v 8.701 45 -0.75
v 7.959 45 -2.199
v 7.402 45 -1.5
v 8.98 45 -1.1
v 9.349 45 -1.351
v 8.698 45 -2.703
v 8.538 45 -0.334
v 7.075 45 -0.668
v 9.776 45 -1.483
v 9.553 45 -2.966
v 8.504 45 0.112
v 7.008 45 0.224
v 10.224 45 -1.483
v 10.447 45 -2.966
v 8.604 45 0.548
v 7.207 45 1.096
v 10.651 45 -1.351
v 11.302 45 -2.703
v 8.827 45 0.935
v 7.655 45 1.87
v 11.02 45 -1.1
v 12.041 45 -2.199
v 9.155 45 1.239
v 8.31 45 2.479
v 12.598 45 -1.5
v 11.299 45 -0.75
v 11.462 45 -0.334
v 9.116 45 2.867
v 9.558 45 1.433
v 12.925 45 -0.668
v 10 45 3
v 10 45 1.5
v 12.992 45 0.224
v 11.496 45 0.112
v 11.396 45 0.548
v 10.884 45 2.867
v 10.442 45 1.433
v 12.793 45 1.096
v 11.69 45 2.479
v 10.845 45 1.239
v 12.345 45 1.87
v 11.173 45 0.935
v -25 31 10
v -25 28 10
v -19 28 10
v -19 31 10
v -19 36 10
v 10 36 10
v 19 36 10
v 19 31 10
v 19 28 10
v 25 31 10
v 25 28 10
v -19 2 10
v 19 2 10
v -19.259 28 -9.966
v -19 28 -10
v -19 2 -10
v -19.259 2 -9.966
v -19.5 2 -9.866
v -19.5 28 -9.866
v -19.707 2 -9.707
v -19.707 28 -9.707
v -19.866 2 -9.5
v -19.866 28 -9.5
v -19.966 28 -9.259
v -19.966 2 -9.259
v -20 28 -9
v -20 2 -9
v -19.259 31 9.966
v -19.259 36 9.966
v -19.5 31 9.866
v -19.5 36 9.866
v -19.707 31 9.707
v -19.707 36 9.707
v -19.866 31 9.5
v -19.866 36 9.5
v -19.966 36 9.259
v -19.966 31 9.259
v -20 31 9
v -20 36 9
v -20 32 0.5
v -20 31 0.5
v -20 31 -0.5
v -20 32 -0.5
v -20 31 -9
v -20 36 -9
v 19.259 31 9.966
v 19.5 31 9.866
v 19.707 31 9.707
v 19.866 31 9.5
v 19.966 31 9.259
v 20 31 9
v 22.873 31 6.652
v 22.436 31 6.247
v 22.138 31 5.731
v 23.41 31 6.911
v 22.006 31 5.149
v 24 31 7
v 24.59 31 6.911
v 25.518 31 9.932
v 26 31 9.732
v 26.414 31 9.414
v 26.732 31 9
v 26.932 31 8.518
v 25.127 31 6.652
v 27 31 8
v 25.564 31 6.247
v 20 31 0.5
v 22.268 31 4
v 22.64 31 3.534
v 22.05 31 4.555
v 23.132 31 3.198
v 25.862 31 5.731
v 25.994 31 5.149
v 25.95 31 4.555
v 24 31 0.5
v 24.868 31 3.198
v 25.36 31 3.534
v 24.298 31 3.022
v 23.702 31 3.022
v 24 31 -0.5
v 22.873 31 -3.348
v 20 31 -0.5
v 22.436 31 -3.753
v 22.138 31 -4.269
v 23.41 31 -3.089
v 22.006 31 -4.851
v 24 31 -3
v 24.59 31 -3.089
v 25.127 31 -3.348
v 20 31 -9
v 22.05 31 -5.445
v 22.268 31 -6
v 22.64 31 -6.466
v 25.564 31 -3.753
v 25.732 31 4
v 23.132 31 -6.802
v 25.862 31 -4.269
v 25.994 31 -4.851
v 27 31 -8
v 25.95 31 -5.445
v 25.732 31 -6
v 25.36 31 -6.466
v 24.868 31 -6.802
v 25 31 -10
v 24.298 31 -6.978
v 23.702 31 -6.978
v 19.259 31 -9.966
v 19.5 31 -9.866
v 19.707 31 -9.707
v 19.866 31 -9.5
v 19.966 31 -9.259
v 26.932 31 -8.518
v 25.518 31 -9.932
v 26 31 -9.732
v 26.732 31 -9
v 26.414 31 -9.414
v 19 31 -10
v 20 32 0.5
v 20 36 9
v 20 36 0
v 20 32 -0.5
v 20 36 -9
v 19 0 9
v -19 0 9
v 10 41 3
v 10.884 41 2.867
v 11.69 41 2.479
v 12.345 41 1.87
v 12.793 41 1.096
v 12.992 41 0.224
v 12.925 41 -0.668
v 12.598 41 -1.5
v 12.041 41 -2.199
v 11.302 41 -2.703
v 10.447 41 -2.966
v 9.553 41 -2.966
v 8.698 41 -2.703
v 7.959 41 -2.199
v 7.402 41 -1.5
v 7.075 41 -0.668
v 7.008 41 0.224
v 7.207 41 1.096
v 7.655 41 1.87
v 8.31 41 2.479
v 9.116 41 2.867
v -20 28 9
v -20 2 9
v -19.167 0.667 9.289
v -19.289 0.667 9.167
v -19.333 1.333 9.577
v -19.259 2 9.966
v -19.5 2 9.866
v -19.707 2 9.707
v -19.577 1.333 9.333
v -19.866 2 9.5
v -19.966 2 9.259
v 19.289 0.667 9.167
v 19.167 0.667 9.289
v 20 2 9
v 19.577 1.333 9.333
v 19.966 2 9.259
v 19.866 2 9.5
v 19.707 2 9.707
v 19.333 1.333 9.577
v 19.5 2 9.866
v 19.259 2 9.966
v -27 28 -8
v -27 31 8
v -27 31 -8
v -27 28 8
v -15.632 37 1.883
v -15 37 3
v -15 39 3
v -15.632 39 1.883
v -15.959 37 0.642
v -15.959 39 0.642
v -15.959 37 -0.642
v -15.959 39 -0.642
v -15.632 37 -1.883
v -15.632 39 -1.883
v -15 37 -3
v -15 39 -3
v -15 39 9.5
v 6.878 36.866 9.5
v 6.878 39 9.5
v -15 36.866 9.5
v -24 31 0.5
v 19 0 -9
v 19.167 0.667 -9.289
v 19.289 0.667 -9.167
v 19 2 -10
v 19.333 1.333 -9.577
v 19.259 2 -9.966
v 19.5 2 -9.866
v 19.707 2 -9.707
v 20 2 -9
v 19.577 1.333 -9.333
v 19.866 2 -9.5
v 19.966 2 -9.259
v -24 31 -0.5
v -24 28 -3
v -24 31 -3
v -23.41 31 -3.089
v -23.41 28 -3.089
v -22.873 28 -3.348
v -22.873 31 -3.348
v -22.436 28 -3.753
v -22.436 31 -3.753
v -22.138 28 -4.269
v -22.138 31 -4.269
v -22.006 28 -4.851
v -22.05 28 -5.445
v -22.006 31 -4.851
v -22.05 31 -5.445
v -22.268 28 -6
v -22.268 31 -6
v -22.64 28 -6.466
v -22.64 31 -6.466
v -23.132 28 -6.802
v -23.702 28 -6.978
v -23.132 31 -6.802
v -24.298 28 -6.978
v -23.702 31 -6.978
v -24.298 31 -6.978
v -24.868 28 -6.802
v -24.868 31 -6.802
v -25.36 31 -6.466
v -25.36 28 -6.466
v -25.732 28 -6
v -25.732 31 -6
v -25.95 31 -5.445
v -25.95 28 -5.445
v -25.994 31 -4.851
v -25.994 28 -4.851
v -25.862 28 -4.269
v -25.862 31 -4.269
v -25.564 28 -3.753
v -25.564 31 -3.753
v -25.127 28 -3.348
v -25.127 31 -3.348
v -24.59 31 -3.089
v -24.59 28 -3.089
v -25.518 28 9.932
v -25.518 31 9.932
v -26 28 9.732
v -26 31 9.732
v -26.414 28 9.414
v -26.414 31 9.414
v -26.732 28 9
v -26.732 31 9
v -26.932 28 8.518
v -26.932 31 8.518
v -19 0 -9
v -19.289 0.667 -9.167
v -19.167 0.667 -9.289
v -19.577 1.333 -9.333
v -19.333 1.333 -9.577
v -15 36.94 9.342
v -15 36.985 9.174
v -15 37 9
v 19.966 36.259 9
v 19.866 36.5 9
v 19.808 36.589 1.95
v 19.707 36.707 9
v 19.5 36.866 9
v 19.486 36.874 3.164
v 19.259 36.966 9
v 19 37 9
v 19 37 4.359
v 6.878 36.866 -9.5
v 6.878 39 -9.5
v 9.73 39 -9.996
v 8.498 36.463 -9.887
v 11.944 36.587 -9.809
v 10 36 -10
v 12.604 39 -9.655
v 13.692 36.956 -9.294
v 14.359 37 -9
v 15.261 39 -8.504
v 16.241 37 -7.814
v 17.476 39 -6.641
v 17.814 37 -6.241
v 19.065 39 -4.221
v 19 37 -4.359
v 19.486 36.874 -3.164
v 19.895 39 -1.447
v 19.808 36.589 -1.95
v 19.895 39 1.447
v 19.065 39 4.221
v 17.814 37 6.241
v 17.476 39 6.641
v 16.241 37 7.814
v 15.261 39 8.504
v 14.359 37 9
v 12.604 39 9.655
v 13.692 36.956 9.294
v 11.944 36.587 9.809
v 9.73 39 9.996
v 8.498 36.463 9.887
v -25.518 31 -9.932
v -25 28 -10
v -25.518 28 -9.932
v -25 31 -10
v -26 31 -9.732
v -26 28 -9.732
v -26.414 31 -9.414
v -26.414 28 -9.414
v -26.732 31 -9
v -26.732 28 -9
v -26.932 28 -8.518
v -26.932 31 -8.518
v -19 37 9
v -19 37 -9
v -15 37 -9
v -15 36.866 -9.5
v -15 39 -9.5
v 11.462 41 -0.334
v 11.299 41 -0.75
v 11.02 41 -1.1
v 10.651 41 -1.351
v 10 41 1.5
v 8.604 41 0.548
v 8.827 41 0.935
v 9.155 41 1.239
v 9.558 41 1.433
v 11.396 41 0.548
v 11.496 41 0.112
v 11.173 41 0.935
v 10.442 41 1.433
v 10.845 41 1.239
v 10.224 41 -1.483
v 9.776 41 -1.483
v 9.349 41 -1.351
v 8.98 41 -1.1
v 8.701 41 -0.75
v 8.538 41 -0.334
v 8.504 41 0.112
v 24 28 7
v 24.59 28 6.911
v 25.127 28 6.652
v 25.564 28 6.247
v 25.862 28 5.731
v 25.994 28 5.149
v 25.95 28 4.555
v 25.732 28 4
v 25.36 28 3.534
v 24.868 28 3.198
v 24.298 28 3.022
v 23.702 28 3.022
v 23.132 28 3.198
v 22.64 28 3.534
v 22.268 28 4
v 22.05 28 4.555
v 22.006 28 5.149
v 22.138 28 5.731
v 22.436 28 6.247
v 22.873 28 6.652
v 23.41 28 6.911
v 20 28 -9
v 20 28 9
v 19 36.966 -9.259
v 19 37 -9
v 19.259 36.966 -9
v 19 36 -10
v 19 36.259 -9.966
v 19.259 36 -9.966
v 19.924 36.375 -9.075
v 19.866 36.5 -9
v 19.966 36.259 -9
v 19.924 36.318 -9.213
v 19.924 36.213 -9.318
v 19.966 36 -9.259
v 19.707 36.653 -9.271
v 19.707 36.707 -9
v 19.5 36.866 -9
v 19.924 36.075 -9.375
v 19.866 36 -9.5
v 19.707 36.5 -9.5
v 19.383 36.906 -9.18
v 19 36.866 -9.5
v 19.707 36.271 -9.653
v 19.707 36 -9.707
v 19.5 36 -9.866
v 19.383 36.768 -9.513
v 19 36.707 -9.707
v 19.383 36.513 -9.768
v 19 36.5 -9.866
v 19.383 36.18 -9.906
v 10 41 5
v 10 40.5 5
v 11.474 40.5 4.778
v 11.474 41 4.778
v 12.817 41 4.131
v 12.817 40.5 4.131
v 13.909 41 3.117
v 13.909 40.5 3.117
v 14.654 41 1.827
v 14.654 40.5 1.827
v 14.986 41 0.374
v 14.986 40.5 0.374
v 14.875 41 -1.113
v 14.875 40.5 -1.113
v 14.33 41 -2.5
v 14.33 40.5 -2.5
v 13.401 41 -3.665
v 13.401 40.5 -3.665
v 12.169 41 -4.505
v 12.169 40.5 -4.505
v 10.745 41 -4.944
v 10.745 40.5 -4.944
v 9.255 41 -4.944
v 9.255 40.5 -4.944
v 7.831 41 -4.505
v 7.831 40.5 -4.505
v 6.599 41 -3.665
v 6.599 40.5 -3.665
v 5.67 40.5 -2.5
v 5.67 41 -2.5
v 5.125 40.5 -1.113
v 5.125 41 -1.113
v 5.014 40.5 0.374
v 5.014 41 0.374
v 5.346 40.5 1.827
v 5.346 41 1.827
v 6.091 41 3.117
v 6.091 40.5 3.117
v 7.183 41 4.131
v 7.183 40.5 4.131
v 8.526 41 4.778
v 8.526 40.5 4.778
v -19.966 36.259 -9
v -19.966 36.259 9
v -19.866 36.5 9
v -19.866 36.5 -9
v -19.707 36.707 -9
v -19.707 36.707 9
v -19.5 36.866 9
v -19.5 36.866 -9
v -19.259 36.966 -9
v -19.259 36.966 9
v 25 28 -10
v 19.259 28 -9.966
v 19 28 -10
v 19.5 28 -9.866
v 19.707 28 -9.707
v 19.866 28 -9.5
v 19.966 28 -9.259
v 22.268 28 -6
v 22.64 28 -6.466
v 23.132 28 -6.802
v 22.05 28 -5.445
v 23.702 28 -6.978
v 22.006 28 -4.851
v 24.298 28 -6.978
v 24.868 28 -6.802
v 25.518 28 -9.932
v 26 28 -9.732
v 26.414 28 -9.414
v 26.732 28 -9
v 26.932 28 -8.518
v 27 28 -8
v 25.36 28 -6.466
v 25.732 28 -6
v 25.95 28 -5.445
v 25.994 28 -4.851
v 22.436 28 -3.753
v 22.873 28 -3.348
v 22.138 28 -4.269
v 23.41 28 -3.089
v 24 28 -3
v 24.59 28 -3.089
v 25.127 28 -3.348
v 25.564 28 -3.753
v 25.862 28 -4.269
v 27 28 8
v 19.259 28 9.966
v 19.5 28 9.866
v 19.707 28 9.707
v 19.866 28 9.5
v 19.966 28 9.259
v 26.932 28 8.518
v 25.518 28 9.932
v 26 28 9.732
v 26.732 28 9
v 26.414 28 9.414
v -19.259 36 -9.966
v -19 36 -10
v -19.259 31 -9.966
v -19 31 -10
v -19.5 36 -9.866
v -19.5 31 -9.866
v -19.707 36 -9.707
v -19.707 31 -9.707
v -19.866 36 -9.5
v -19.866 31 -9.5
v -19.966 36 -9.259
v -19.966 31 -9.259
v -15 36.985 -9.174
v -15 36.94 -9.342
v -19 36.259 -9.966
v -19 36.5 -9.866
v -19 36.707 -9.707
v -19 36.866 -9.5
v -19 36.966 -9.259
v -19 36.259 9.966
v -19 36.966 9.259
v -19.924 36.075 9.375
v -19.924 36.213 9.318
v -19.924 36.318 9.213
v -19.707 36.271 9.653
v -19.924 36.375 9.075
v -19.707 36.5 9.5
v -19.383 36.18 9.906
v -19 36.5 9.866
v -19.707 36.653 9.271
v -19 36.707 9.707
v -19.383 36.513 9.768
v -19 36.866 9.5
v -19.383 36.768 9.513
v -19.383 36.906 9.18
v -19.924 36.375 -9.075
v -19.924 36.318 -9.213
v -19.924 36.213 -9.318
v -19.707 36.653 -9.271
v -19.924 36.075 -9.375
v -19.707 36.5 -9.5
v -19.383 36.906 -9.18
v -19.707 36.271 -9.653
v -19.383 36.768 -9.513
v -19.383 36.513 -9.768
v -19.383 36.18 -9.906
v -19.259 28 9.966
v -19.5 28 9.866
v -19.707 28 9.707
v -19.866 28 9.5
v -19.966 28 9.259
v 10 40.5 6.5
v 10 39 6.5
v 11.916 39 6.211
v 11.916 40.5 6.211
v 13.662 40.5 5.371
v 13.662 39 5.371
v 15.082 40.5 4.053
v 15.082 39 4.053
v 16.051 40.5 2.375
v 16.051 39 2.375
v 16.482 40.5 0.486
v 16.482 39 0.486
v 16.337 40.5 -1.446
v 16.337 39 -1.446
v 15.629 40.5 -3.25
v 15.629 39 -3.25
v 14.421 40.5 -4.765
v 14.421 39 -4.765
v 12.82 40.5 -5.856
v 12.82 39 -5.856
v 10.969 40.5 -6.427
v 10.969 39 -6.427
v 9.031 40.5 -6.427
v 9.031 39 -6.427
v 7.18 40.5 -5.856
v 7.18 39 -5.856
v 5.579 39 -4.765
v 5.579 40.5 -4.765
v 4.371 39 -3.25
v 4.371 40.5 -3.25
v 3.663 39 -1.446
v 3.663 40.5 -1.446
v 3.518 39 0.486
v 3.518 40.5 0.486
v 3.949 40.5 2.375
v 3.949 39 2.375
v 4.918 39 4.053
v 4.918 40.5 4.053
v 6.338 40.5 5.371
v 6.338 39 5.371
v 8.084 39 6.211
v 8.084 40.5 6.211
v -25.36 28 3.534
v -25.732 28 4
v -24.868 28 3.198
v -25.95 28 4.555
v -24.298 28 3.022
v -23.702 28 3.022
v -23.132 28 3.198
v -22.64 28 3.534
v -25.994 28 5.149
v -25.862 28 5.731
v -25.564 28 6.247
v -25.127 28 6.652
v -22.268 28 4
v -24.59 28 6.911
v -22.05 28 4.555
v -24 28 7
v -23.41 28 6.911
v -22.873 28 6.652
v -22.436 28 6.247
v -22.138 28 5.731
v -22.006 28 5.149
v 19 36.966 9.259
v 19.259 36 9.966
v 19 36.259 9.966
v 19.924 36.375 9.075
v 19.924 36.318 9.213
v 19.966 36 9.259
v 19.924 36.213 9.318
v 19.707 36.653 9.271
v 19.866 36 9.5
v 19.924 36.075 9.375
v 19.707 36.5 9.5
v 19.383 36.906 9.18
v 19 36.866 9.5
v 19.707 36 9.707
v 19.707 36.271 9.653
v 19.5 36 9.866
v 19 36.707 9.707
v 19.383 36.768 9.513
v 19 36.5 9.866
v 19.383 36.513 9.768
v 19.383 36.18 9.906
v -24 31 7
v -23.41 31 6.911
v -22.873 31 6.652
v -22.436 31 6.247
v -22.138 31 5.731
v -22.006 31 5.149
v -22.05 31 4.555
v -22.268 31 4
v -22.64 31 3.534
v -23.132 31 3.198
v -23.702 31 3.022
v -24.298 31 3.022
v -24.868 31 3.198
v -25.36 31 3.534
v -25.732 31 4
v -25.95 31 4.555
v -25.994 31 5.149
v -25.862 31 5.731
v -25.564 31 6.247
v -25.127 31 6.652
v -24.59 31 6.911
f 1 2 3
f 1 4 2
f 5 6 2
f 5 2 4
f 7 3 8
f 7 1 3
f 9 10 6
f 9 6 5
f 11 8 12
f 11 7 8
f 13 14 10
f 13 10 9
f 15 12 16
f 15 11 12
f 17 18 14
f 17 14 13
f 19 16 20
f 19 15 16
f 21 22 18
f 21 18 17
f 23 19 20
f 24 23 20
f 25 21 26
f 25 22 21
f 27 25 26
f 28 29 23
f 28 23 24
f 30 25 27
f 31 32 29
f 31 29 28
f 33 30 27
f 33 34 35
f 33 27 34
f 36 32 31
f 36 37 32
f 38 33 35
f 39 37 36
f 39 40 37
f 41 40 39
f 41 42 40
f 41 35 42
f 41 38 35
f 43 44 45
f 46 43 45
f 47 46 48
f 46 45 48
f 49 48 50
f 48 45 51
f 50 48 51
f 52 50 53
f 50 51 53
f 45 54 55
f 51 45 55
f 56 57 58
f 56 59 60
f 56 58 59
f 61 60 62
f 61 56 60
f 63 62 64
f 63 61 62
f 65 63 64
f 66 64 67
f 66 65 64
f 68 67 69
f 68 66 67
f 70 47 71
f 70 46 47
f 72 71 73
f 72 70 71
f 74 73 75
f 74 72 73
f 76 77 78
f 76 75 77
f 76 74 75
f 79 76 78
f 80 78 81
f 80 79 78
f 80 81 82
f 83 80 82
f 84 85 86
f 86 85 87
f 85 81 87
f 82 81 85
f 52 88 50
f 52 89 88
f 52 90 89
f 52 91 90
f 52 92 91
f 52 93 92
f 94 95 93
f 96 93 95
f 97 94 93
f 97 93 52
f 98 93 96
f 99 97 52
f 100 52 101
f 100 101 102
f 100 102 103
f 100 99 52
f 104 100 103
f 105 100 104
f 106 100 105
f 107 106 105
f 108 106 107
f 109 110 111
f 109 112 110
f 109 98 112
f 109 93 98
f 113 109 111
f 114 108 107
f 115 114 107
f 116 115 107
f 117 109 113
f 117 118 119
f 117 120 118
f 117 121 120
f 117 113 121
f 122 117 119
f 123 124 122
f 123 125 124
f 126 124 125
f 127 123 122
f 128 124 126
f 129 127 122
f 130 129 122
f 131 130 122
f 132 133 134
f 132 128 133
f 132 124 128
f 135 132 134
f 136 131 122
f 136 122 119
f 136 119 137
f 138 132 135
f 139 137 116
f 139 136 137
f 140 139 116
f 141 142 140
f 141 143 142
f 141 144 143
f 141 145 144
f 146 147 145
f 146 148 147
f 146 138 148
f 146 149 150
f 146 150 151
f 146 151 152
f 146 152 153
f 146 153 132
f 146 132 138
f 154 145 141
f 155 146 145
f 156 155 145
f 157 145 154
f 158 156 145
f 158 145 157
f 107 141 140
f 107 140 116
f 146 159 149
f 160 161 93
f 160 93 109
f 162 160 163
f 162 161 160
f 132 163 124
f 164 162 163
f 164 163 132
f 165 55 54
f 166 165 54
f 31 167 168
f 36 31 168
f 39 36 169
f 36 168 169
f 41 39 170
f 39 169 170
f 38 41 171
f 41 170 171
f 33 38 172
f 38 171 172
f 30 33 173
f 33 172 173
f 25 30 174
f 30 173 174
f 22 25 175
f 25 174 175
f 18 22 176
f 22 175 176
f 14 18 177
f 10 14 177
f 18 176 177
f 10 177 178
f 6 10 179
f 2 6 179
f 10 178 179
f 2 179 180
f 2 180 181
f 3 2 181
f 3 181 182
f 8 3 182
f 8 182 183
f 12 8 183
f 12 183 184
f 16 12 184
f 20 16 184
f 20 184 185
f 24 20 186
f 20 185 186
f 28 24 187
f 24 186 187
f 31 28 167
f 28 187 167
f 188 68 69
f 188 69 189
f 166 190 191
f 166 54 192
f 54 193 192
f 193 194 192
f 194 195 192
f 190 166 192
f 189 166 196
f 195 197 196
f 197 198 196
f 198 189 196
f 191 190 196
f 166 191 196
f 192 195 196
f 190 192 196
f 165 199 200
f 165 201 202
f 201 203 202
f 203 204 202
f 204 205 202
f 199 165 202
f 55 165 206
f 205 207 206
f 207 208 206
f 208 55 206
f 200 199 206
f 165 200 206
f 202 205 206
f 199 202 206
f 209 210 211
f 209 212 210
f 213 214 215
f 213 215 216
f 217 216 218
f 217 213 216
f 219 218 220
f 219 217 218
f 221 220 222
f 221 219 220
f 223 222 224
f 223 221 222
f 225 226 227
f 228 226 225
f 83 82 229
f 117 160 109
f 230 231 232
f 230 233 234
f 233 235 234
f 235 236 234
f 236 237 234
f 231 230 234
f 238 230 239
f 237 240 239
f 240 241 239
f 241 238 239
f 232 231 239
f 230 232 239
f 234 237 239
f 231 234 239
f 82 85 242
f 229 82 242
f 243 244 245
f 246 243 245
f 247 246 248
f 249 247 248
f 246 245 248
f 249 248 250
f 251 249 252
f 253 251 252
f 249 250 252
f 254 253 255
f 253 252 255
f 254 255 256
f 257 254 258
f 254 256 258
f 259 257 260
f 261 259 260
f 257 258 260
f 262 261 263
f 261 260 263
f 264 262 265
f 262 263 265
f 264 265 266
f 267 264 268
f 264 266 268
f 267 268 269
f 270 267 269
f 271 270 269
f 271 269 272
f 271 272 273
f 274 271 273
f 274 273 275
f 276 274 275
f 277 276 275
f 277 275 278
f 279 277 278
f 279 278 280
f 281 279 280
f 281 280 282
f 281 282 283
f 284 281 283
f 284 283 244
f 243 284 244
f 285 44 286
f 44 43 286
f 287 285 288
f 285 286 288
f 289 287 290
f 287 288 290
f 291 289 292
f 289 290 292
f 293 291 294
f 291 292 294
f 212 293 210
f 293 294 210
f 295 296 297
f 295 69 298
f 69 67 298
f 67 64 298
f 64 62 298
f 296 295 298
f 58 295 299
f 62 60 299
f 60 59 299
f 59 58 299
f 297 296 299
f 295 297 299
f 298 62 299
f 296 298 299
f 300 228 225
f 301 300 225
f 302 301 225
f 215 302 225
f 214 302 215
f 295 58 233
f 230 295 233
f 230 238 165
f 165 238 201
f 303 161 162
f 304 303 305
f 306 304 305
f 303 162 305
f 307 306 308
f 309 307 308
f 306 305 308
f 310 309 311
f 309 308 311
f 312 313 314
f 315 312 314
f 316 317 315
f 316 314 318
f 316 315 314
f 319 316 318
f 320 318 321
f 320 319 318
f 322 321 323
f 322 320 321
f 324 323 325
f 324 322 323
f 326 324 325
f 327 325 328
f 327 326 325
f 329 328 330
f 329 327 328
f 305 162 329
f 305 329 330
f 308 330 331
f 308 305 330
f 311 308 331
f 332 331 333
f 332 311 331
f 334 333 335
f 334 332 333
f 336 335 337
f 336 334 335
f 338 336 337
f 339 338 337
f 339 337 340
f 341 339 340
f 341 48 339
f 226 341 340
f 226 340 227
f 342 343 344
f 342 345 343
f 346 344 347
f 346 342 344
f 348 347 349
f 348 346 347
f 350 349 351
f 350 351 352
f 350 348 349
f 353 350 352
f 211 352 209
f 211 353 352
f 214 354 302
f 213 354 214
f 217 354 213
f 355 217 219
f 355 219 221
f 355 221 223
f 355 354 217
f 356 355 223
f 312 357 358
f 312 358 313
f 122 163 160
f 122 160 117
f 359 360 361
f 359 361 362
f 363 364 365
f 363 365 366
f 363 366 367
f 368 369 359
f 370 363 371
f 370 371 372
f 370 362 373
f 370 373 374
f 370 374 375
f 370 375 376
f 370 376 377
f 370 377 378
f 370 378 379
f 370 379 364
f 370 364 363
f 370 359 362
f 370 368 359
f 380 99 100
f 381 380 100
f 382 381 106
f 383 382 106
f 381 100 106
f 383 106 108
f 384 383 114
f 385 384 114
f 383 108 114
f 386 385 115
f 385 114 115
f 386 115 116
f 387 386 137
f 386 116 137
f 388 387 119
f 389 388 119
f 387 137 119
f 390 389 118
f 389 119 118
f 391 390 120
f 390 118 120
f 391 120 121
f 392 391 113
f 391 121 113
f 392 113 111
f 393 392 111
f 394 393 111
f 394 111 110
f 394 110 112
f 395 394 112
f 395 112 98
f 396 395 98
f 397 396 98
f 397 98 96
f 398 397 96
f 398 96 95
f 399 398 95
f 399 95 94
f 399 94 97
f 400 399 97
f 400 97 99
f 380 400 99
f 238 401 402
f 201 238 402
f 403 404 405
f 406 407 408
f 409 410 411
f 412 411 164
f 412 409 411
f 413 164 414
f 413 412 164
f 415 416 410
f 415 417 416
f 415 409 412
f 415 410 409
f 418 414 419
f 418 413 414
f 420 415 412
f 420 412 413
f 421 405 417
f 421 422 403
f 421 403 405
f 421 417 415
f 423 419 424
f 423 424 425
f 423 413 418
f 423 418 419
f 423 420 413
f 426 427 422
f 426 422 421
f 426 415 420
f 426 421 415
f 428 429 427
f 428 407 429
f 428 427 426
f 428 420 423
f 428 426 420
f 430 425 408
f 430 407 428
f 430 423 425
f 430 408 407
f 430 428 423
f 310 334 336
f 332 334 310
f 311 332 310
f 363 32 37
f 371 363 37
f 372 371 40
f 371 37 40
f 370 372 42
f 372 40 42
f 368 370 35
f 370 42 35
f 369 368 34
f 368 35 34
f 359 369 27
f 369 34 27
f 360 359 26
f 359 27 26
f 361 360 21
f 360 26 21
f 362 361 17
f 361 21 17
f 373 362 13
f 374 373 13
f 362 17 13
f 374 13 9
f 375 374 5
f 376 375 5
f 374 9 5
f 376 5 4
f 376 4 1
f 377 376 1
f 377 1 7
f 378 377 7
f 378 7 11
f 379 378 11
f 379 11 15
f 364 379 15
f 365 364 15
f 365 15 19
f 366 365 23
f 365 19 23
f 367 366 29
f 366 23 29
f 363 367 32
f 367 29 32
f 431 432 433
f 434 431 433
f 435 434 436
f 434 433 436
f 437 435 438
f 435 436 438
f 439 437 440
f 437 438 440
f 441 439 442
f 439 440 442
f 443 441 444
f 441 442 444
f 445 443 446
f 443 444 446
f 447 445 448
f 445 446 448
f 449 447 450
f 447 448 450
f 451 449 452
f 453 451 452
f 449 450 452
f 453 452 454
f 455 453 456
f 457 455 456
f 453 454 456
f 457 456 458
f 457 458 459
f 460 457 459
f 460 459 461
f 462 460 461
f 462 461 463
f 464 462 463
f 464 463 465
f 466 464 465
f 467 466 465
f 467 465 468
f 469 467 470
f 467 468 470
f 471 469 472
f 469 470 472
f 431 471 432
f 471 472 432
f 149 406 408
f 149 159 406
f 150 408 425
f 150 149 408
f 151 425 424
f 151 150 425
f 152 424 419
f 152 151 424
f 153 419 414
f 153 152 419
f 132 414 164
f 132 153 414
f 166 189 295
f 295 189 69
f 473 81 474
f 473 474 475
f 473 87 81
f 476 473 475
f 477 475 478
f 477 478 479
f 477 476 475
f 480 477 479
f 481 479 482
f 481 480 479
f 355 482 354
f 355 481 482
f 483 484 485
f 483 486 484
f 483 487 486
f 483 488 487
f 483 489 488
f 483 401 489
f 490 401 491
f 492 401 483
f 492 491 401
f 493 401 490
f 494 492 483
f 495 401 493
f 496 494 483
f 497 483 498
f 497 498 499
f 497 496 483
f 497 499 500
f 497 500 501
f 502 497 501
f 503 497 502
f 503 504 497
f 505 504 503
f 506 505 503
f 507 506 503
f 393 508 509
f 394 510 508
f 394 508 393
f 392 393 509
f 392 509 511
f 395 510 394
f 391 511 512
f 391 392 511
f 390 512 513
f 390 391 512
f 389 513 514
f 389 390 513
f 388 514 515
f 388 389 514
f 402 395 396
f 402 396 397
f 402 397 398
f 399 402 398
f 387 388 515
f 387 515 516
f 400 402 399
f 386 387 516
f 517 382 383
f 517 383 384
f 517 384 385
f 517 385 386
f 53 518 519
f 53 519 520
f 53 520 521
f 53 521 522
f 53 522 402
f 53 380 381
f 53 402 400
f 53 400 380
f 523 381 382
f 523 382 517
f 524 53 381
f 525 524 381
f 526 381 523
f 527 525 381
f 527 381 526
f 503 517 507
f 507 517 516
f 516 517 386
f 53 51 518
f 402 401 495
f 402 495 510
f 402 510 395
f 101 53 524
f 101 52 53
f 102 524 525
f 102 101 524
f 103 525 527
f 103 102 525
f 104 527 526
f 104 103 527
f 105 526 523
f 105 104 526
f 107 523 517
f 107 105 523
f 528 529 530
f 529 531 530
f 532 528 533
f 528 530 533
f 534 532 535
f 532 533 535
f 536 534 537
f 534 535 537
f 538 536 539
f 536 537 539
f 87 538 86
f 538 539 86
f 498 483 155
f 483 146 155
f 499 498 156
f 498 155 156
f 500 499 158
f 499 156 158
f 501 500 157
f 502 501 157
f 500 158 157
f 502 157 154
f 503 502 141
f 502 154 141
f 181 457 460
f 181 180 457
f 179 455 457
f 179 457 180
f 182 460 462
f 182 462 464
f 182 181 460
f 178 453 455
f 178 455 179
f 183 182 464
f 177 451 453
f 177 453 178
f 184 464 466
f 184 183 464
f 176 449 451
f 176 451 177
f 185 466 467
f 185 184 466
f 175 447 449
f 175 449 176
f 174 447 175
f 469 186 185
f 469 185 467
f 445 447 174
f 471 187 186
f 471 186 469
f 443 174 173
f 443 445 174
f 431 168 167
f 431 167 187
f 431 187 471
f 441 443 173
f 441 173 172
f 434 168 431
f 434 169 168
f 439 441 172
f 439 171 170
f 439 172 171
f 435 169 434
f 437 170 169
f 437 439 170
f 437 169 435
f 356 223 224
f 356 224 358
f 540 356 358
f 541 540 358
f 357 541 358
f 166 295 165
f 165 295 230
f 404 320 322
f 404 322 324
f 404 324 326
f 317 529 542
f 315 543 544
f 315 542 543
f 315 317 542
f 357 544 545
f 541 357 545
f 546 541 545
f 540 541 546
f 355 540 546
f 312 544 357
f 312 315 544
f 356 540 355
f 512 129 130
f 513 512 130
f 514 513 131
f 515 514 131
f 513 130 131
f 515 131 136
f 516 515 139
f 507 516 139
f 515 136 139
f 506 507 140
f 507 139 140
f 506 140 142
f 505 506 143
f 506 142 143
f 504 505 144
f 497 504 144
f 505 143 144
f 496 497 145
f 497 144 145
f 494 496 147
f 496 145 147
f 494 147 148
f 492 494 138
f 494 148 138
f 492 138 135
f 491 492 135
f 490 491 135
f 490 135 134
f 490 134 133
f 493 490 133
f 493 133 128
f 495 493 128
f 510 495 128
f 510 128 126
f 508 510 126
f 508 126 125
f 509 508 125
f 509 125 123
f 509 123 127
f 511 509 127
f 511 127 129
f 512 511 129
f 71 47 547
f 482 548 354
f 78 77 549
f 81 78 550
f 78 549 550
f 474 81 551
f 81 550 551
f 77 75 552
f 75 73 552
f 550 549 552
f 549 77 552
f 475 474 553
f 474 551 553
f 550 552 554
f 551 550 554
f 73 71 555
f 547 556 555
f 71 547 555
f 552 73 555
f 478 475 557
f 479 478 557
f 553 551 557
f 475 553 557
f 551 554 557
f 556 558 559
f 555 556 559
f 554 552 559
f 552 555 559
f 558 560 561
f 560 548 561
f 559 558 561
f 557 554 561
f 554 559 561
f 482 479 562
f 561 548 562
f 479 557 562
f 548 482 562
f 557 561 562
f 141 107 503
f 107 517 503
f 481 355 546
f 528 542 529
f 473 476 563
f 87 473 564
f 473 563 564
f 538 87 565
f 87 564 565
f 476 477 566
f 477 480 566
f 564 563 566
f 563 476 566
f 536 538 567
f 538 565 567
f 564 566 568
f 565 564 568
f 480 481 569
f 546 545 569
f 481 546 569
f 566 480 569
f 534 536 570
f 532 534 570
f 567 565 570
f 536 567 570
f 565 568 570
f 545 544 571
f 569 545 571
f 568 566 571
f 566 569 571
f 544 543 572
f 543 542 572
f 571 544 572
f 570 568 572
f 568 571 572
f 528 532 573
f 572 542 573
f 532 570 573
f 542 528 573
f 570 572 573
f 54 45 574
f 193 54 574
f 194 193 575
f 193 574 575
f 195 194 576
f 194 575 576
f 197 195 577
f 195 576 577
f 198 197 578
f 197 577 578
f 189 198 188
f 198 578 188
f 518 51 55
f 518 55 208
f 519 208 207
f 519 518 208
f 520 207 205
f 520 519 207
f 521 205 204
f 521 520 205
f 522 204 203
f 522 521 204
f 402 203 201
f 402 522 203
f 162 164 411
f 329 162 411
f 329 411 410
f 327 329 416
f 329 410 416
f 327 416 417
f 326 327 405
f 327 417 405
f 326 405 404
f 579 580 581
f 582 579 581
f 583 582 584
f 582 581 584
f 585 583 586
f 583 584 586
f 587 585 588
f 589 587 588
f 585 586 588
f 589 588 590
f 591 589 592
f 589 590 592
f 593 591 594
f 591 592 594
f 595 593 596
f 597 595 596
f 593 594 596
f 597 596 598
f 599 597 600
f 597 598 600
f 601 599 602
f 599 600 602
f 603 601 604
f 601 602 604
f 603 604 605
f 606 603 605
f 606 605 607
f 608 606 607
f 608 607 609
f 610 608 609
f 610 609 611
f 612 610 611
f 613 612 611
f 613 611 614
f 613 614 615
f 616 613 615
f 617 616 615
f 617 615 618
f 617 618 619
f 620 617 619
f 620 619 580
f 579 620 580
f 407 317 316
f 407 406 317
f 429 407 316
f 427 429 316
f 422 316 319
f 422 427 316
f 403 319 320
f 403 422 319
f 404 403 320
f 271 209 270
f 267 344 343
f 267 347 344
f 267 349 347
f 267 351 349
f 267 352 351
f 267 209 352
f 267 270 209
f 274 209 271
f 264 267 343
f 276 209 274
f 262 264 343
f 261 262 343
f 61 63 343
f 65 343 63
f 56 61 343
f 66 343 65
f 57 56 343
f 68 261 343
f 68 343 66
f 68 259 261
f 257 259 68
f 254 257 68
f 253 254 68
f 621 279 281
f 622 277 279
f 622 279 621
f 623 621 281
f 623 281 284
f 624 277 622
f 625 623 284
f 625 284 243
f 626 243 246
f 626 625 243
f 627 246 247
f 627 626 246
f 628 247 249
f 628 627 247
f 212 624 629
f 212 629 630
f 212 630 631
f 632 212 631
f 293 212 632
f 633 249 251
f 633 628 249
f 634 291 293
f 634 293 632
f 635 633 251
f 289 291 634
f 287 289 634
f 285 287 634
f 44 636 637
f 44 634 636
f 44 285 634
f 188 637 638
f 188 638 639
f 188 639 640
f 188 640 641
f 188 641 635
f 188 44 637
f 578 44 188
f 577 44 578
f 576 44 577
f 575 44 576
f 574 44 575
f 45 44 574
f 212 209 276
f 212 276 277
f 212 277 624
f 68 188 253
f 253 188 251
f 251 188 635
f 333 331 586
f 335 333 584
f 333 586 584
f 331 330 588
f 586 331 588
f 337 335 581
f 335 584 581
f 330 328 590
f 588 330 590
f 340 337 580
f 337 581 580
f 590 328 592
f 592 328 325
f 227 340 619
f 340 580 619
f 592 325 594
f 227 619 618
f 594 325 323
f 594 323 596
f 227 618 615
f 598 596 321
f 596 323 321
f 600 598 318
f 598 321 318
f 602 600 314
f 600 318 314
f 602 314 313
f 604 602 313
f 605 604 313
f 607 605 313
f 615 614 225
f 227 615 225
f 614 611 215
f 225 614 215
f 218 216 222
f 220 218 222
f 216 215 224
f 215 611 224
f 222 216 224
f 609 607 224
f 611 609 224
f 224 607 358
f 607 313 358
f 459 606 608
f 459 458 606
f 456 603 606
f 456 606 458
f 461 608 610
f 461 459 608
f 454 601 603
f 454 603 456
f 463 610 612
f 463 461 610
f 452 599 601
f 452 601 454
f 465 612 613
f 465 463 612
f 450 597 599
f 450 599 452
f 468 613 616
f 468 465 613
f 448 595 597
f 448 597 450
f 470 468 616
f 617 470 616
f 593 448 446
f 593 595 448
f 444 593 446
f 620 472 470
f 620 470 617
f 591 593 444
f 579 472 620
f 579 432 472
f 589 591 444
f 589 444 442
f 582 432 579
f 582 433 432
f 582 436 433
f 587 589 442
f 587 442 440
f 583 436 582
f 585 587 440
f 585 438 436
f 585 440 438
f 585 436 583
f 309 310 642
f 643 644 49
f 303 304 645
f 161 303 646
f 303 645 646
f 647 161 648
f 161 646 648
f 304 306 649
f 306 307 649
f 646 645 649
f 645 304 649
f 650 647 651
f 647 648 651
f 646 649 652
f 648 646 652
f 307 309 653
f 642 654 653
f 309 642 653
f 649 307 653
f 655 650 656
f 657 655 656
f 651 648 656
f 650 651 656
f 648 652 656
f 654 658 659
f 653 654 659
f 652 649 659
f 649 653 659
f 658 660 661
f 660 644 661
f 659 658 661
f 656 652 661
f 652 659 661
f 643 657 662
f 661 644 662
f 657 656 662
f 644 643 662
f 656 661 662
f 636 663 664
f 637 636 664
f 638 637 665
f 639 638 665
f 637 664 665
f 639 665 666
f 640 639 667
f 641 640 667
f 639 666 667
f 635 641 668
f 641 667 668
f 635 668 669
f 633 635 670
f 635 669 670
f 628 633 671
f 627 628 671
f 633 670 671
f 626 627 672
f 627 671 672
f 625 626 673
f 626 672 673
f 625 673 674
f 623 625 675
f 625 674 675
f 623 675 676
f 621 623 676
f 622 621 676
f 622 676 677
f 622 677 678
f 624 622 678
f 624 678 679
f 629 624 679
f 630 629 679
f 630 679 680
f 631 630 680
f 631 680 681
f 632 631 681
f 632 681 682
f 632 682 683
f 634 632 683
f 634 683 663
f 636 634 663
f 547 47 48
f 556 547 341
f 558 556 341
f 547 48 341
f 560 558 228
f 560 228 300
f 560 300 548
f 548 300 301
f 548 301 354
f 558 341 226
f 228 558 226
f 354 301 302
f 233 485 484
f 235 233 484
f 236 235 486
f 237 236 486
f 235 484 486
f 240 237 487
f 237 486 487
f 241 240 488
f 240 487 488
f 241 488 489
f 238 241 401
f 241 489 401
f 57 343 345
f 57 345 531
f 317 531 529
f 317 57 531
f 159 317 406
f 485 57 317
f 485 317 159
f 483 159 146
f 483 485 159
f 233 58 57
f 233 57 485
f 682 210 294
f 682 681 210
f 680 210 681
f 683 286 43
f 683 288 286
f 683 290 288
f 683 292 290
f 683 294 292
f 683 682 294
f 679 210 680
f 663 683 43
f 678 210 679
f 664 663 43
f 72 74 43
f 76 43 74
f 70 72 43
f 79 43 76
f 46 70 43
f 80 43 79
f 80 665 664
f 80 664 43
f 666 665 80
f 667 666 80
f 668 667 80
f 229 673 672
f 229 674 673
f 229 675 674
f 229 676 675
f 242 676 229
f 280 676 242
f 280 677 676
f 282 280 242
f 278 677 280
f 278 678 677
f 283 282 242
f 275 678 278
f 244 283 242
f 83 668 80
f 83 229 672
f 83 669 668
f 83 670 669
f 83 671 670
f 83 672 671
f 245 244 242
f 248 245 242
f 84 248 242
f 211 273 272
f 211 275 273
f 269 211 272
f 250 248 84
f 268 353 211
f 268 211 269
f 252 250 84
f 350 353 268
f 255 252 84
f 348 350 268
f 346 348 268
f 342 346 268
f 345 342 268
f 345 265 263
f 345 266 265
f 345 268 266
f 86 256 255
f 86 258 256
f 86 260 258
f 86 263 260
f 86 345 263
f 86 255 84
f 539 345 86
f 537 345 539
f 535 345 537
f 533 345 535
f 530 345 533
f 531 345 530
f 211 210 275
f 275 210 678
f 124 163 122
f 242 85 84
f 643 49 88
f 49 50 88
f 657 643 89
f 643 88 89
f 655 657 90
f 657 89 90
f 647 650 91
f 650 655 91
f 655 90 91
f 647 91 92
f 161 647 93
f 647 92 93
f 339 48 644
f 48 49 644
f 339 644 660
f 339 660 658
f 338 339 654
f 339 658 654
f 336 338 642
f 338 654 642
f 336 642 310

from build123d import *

# Parameters (mm, degrees)
SKETCH_1_W          = 54
SKETCH_1_H          = 20
EXTRUDE_1_DEPTH     = 37
SKETCH_2_W          = 67.922695334
SKETCH_2_H          = 39.407561178
SKETCH_2_W_2        = 40
SKETCH_2_H_2        = 20
CUT_EXTRUDE_1_DEPTH = 28
SKETCH_3_W          = 67.922695334
SKETCH_3_H          = 33.385731604
SKETCH_3_W_2        = 40
SKETCH_3_H_2        = 20
CUT_EXTRUDE_2_DEPTH = 6
FILLET_1_R          = 1
FILLET_2_R          = 2
CHAMFER_1_SIZE      = 1
CHAMFER_1_SIZE2     = 2
SKETCH_4_R          = 2
CUT_EXTRUDE_3_DEPTH = 30
RIB_1_REACH         = 48.883
SKETCH_5_WALL_W     = 99.888770984
SKETCH_5_WALL_H     = 1
EXTRUDE_START       = -1
EXTRUDE_4_DEPTH     = 3
SKETCH_9_R          = 6.5
EXTRUDE_5_DEPTH     = 2
CUT_EXTRUDE_START   = -0.5
SKETCH_10_R         = 6.5
SKETCH_10_R_2       = 5
CUT_EXTRUDE_4_DEPTH = 0.5
SKETCH_11_R         = 3
EXTRUDE_6_DEPTH     = 4
SKETCH_14_R         = 1.5
CUT_EXTRUDE_5_DEPTH = 4


with BuildPart() as part:
    # 草图1 → 凸台-拉伸1 (new body)
    with BuildSketch(Plane(origin=(0, 0, 0), x_dir=(1, 0, 0), z_dir=(0, 1, 0))):
        Rectangle(SKETCH_1_W, SKETCH_1_H)
    extrude(amount=EXTRUDE_1_DEPTH)

    # 草图2 → 切除-拉伸1 (cut)
    with BuildSketch(Plane.XZ):
        Rectangle(SKETCH_2_W, SKETCH_2_H)
        Rectangle(SKETCH_2_W_2, SKETCH_2_H_2, mode=Mode.SUBTRACT)
    extrude(amount=-CUT_EXTRUDE_1_DEPTH, mode=Mode.SUBTRACT)

    # 草图3 → 切除-拉伸2 (cut)
    with BuildSketch(Plane(origin=(0, 37, 0), x_dir=(1, 0, 0), z_dir=(0, 1, 0))):
        Rectangle(SKETCH_3_W, SKETCH_3_H)
        Rectangle(SKETCH_3_W_2, SKETCH_3_H_2, mode=Mode.SUBTRACT)
    extrude(amount=-CUT_EXTRUDE_2_DEPTH, mode=Mode.SUBTRACT)

    # 圆角1
    fillet_1_edges = [part.edges().sort_by_distance(p)[0] for p in [
        (20, 14, -10),
        (-20, 14, -10),
        (-20, 14, 10),
        (20, 14, 10),
        (0, 37, -10),
        (0, 37, 10),
        (20, 37, 0),
        (20, 34, 10),
        (-20, 34, 10),
        (-20, 37, 0),
        (-20, 34, -10),
        (20, 34, -10),
    ]]
    fillet(fillet_1_edges, radius=FILLET_1_R)

    # 圆角2
    fillet_2_edges = [part.edges().sort_by_distance(p)[0] for p in [
        (27, 29.5, 10),
        (-27, 29.5, 10),
        (-27, 29.5, -10),
        (27, 29.5, -10),
    ]]
    fillet(fillet_2_edges, radius=FILLET_2_R)

    # 倒角1
    chamfer_1_edges = [part.edges().sort_by_distance(p)[0] for p in [
        (0, 0, -10),
        (0, 0, 10),
        (-20, 0, 0),
        (20, 0, 0),
        (-19.707106781, 0, 9.707106781),
        (19.707106781, 0, 9.707106781),
        (19.707106781, 0, -9.707106781),
        (-19.707106781, 0, -9.707106781),
    ]]
    chamfer_1_side = [part.faces().sort_by_distance(p)[0] for p in [
        (0, 0, 0),
    ]]
    chamfer(chamfer_1_edges, length=CHAMFER_1_SIZE, length2=CHAMFER_1_SIZE2, reference=chamfer_1_side[0])

    # 草图4 → 切除-拉伸3 (cut)
    with BuildSketch(Plane(origin=(0, 37, 0), x_dir=(1, 0, 0), z_dir=(0, 1, 0))):
        with Locations(Location((-24, 5, 0), (0, 0, 270))):
            Circle(SKETCH_4_R)
        with Locations(Location((-24, -5, 0), (0, 0, 270))):
            Circle(SKETCH_4_R)
        with Locations(Location((24, -5, 0), (0, 0, 270))):
            Circle(SKETCH_4_R)
        with Locations(Location((24, 5, 0), (0, 0, 270))):
            Circle(SKETCH_4_R)
    extrude(amount=-CUT_EXTRUDE_3_DEPTH, mode=Mode.SUBTRACT)

    # 草图5 wall → 筋1 (add, up to next)
    with BuildSketch(Plane(origin=(-22, 31.5, 0), x_dir=(-0.970142500145, -0.242535625036, 0), z_dir=(0.242535625036, -0.970142500145, 0)), mode=Mode.PRIVATE) as rib_1_sk1:
        Rectangle(SKETCH_5_WALL_W, SKETCH_5_WALL_H)
    rib_1_tool1 = extrude(rib_1_sk1.sketch, amount=RIB_1_REACH, mode=Mode.PRIVATE) - part.part
    rib_1 = rib_1_tool1.solids().sort_by_distance((-22, 31.5, 0))[0]
    add(rib_1)

    # 镜向1: 筋1 across plane
    add(rib_1.mirror(Plane(origin=(0, 0, 0), x_dir=(0, 0, 1), z_dir=(1, 0, 0))))

    # 草图8 → 凸台-拉伸4 (add)
    with BuildSketch(Plane(origin=(0, 37, 0), x_dir=(1, 0, 0), z_dir=(0, 1, 0)).offset(EXTRUDE_START)):
        with BuildLine():
            Line((-15, 9.5), (6.877501001, 9.5))
            ThreePointArc((6.877501001, 9.5), (20, 0), (6.877501001, -9.5))
            Line((6.877501001, -9.5), (-15, -9.5))
            Line((-15, -9.5), (-15, -3))
            ThreePointArc((-15, -3), (-16, 0), (-15, 3))
            Line((-15, 3), (-15, 9.5))
        make_face()
    extrude(amount=EXTRUDE_4_DEPTH)

    # 草图9 → 凸台-拉伸5 (add)
    with BuildSketch(Plane(origin=(0, 39, 0), x_dir=(1, 0, 0), z_dir=(0, 1, 0))):
        with Locations(Location((10, 0, 0), (0, 0, 270))):
            Circle(SKETCH_9_R)
    extrude(amount=EXTRUDE_5_DEPTH)

    # 草图10 → 切除-拉伸4 (cut)
    with BuildSketch(Plane(origin=(0, 41, 0), x_dir=(1, 0, 0), z_dir=(0, 1, 0)).offset(CUT_EXTRUDE_START)):
        with Locations(Location((10, 0, 0), (0, 0, 270))):
            Circle(SKETCH_10_R)
        with Locations(Location((10, 0, 0), (0, 0, 270))):
            Circle(SKETCH_10_R_2, mode=Mode.SUBTRACT)
    extrude(amount=CUT_EXTRUDE_4_DEPTH, mode=Mode.SUBTRACT)

    # 草图11 → 凸台-拉伸6 (add)
    with BuildSketch(Plane(origin=(0, 41, 0), x_dir=(1, 0, 0), z_dir=(0, 1, 0))):
        with Locations(Location((10, 0, 0), (0, 0, 270))):
            Circle(SKETCH_11_R)
    extrude(amount=EXTRUDE_6_DEPTH)

    # 草图14 → 切除-拉伸5 (cut)
    with BuildSketch(Plane(origin=(0, 45, 0), x_dir=(1, 0, 0), z_dir=(0, 1, 0))):
        with Locations(Location((10, 0, 0), (0, 0, 270))):
            Circle(SKETCH_14_R)
    extrude(amount=-CUT_EXTRUDE_5_DEPTH, mode=Mode.SUBTRACT)


solid = part.part
